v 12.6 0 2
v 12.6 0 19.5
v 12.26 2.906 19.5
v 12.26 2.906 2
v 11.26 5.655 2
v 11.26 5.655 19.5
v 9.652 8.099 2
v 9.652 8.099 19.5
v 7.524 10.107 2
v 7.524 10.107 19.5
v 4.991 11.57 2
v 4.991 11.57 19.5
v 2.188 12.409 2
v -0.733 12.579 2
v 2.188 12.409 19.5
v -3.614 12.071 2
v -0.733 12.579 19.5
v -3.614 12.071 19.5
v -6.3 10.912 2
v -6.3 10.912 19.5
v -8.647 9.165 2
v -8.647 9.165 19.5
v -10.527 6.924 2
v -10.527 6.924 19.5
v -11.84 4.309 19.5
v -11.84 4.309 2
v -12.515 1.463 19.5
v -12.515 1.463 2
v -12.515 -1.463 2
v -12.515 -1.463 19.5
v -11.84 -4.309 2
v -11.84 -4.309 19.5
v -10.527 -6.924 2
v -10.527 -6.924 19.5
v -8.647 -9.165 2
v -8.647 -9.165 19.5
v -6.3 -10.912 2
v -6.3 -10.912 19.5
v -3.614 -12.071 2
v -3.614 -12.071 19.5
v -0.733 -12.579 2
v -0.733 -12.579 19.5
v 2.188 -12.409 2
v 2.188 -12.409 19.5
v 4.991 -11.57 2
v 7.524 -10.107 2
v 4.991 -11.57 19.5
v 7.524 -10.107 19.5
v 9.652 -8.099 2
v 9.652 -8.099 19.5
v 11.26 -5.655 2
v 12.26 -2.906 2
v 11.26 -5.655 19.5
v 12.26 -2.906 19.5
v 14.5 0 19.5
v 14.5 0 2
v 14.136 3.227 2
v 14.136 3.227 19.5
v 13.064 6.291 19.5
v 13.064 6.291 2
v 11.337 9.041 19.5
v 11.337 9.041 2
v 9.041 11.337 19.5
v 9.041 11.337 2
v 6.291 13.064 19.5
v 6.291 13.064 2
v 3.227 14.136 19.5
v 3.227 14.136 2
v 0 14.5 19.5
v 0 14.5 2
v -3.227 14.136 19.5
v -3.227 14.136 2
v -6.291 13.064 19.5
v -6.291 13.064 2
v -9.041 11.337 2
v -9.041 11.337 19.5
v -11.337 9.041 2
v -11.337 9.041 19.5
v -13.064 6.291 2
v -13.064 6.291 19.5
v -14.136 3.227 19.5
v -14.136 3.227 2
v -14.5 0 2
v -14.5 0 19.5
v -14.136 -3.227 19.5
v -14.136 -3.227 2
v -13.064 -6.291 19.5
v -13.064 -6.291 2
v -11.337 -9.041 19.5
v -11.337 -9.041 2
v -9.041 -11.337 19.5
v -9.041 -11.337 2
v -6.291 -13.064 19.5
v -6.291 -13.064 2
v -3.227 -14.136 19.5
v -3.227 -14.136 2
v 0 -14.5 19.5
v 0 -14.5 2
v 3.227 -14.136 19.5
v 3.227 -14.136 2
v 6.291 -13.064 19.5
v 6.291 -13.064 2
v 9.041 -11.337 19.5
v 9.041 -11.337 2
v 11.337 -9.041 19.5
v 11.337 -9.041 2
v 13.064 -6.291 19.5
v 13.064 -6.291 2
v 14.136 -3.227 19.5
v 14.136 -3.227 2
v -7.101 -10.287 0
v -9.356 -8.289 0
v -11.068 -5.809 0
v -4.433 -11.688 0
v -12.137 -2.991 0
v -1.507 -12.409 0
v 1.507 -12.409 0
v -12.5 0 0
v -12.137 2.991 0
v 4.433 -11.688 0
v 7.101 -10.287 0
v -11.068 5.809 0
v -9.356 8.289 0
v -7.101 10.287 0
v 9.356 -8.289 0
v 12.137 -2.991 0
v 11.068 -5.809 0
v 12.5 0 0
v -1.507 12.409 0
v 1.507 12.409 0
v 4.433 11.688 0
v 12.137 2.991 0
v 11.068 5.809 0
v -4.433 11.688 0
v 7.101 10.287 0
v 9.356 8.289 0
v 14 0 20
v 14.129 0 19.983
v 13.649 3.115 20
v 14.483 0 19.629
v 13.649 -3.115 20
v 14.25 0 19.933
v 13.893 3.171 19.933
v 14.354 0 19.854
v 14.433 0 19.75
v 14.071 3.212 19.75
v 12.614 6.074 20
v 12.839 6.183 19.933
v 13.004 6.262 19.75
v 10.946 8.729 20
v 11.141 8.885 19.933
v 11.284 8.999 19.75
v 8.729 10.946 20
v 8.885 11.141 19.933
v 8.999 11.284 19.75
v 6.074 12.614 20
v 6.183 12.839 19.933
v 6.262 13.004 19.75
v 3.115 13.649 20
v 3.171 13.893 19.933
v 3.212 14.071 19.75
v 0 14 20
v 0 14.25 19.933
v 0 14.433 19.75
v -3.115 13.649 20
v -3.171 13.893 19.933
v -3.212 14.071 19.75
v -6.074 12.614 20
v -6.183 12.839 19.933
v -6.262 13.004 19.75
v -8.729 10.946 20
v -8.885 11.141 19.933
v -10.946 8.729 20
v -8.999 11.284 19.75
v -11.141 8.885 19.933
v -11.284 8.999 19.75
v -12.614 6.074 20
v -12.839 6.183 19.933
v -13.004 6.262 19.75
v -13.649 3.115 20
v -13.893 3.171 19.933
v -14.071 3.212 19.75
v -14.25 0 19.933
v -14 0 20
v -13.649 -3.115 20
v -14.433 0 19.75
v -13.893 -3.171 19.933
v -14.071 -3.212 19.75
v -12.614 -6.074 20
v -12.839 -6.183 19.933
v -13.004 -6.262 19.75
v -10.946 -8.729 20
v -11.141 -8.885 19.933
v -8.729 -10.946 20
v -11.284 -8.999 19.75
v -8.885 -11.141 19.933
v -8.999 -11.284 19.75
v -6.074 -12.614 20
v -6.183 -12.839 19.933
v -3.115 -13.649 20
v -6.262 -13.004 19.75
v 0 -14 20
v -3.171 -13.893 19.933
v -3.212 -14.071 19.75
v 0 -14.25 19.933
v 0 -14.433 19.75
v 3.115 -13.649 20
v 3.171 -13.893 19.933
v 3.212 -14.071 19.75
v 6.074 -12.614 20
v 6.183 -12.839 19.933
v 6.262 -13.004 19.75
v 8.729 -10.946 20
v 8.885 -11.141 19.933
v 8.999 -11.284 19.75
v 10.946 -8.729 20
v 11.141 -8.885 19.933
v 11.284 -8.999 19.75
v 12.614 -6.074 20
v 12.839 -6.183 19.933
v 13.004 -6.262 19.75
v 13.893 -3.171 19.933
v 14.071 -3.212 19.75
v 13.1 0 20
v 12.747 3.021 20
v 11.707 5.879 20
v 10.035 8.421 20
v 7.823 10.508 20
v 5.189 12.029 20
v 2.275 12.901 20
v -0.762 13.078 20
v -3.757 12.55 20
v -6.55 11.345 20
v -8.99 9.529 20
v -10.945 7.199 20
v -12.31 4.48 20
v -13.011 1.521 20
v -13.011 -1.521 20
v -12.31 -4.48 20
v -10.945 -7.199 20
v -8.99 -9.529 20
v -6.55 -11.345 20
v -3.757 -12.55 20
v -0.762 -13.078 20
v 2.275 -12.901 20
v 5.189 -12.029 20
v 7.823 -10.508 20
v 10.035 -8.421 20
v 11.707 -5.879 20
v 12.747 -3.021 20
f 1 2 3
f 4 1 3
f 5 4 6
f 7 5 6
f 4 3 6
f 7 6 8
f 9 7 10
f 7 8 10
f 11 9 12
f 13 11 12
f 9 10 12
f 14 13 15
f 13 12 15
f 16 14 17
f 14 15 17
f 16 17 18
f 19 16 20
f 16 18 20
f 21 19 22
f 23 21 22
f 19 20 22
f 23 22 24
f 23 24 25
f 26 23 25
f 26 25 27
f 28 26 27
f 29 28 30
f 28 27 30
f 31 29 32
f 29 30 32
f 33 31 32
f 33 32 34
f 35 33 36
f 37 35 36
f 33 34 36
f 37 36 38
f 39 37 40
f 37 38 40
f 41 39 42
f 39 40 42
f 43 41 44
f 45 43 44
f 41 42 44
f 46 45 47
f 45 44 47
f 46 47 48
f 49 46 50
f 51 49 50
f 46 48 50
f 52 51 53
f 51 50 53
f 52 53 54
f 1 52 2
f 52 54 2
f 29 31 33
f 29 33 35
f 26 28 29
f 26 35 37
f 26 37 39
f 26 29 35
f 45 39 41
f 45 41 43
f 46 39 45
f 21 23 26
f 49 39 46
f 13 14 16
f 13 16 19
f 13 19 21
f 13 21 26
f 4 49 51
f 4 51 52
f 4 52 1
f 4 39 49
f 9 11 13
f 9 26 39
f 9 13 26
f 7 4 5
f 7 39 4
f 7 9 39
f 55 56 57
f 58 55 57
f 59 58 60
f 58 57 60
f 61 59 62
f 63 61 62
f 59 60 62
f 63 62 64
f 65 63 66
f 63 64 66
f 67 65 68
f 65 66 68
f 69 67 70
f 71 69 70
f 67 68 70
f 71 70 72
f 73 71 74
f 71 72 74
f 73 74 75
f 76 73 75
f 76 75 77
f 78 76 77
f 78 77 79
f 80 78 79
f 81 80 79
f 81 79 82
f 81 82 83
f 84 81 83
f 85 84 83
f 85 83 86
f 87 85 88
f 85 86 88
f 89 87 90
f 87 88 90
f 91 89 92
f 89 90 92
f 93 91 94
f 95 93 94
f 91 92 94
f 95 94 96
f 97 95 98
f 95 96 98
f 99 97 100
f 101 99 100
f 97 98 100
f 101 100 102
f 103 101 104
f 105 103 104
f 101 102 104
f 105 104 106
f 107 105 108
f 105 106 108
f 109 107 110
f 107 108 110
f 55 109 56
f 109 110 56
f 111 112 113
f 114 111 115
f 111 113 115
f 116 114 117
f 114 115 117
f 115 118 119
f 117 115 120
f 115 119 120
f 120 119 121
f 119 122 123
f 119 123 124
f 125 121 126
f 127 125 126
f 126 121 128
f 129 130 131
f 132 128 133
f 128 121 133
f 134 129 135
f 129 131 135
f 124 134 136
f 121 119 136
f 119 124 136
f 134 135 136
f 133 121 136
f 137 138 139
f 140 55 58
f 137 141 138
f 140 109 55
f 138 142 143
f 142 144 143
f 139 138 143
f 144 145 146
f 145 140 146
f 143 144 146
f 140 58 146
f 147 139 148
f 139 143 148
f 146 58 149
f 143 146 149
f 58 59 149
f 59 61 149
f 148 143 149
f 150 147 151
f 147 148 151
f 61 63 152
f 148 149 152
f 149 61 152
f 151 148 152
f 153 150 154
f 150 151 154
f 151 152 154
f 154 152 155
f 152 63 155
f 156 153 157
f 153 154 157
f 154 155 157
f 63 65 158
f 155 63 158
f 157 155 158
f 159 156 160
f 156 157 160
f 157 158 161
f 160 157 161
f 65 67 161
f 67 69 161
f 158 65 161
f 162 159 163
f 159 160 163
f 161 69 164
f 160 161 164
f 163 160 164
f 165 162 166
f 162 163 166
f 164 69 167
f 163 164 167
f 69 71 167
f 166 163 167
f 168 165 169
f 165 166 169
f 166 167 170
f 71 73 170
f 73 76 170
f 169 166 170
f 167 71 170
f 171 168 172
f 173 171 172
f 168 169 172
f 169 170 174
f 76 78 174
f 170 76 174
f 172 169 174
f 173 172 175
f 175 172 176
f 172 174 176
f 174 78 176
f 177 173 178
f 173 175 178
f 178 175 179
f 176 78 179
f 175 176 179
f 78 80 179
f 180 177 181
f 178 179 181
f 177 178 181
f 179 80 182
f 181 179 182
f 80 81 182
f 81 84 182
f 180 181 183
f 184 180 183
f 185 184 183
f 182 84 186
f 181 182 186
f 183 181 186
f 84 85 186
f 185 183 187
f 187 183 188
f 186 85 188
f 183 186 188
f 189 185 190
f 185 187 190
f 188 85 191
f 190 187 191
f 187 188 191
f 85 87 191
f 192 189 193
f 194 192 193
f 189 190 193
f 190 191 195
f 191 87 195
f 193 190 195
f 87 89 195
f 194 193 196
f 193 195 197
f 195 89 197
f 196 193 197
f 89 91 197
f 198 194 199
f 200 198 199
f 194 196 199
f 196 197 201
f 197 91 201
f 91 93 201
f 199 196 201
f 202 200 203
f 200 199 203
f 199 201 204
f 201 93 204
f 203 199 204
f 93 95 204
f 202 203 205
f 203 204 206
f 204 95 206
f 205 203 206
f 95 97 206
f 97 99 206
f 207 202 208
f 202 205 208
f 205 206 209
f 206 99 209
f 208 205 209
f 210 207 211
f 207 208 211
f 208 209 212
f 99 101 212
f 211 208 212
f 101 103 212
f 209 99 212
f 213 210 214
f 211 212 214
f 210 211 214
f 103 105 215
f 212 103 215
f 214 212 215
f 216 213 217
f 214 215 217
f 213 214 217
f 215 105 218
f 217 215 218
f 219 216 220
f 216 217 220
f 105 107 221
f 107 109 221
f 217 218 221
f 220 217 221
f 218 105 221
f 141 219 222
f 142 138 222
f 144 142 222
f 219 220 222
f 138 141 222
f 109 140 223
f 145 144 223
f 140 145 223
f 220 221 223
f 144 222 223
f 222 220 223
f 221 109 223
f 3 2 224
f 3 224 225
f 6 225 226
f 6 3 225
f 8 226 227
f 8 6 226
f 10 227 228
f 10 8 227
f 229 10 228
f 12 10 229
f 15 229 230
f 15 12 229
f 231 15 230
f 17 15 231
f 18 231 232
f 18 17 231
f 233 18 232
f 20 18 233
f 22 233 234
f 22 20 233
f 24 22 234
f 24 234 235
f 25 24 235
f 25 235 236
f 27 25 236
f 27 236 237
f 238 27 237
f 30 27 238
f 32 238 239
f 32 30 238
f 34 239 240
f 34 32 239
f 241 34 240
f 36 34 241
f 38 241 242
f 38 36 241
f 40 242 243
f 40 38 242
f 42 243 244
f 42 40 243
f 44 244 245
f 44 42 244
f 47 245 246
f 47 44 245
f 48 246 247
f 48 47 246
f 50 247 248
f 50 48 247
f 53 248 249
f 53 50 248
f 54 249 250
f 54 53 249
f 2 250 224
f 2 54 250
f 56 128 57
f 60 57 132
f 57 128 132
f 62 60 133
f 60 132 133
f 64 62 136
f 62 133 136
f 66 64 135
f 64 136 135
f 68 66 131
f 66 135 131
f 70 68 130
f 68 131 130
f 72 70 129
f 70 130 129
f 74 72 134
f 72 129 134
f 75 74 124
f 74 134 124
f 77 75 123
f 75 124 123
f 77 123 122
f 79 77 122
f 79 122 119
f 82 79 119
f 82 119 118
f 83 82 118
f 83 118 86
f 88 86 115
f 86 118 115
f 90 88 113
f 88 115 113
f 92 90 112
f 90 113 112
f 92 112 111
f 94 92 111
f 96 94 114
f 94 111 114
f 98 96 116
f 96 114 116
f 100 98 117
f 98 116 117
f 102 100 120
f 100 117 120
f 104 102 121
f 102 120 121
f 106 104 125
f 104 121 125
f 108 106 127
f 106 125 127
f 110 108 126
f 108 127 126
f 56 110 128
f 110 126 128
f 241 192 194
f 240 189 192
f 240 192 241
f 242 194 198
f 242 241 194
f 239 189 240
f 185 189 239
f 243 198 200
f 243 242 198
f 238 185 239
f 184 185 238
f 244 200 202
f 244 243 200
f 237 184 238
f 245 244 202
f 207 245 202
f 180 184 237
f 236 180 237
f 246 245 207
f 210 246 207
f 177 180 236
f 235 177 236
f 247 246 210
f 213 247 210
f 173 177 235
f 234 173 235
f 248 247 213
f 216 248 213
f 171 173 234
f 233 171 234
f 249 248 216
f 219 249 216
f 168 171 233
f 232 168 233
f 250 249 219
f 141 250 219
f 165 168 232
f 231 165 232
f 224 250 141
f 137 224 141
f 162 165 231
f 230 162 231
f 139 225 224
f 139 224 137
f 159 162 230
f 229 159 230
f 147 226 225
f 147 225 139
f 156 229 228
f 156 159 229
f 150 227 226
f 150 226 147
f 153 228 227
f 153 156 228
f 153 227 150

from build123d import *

# Parameters (mm, degrees)
SKETCH_R        = 14.5
PAD_DEPTH       = 20
SKETCH001_R     = 12.6
POCKET_DEPTH    = 18
CHAMFER_SIZE    = 2
CHAMFER001_SIZE = 0.5
FILLET_R        = 0.5


with BuildPart() as part:
    # Sketch → Pad (new body)
    with BuildSketch(Plane.XY):
        Circle(SKETCH_R)
    extrude(amount=PAD_DEPTH)

    # Sketch001 (on Face3 of Pad) → Pocket (cut)
    with BuildSketch(Plane.XY.offset(20)):
        Circle(SKETCH001_R)
    extrude(amount=-POCKET_DEPTH, mode=Mode.SUBTRACT)

    # Chamfer
    chamfer_edges = [part.edges().sort_by_distance(p)[0] for p in [
        (-14.5, 0, 0),
    ]]
    chamfer(chamfer_edges, length=CHAMFER_SIZE)

    # Chamfer001
    chamfer001_edges = [part.edges().sort_by_distance(p)[0] for p in [
        (-12.6, 0, 20),
    ]]
    chamfer(chamfer001_edges, length=CHAMFER001_SIZE)

    # Fillet
    fillet_edges = [part.edges().sort_by_distance(p)[0] for p in [
        (-14.5, 0, 20),
    ]]
    fillet(fillet_edges, radius=FILLET_R)


solid = part.part
